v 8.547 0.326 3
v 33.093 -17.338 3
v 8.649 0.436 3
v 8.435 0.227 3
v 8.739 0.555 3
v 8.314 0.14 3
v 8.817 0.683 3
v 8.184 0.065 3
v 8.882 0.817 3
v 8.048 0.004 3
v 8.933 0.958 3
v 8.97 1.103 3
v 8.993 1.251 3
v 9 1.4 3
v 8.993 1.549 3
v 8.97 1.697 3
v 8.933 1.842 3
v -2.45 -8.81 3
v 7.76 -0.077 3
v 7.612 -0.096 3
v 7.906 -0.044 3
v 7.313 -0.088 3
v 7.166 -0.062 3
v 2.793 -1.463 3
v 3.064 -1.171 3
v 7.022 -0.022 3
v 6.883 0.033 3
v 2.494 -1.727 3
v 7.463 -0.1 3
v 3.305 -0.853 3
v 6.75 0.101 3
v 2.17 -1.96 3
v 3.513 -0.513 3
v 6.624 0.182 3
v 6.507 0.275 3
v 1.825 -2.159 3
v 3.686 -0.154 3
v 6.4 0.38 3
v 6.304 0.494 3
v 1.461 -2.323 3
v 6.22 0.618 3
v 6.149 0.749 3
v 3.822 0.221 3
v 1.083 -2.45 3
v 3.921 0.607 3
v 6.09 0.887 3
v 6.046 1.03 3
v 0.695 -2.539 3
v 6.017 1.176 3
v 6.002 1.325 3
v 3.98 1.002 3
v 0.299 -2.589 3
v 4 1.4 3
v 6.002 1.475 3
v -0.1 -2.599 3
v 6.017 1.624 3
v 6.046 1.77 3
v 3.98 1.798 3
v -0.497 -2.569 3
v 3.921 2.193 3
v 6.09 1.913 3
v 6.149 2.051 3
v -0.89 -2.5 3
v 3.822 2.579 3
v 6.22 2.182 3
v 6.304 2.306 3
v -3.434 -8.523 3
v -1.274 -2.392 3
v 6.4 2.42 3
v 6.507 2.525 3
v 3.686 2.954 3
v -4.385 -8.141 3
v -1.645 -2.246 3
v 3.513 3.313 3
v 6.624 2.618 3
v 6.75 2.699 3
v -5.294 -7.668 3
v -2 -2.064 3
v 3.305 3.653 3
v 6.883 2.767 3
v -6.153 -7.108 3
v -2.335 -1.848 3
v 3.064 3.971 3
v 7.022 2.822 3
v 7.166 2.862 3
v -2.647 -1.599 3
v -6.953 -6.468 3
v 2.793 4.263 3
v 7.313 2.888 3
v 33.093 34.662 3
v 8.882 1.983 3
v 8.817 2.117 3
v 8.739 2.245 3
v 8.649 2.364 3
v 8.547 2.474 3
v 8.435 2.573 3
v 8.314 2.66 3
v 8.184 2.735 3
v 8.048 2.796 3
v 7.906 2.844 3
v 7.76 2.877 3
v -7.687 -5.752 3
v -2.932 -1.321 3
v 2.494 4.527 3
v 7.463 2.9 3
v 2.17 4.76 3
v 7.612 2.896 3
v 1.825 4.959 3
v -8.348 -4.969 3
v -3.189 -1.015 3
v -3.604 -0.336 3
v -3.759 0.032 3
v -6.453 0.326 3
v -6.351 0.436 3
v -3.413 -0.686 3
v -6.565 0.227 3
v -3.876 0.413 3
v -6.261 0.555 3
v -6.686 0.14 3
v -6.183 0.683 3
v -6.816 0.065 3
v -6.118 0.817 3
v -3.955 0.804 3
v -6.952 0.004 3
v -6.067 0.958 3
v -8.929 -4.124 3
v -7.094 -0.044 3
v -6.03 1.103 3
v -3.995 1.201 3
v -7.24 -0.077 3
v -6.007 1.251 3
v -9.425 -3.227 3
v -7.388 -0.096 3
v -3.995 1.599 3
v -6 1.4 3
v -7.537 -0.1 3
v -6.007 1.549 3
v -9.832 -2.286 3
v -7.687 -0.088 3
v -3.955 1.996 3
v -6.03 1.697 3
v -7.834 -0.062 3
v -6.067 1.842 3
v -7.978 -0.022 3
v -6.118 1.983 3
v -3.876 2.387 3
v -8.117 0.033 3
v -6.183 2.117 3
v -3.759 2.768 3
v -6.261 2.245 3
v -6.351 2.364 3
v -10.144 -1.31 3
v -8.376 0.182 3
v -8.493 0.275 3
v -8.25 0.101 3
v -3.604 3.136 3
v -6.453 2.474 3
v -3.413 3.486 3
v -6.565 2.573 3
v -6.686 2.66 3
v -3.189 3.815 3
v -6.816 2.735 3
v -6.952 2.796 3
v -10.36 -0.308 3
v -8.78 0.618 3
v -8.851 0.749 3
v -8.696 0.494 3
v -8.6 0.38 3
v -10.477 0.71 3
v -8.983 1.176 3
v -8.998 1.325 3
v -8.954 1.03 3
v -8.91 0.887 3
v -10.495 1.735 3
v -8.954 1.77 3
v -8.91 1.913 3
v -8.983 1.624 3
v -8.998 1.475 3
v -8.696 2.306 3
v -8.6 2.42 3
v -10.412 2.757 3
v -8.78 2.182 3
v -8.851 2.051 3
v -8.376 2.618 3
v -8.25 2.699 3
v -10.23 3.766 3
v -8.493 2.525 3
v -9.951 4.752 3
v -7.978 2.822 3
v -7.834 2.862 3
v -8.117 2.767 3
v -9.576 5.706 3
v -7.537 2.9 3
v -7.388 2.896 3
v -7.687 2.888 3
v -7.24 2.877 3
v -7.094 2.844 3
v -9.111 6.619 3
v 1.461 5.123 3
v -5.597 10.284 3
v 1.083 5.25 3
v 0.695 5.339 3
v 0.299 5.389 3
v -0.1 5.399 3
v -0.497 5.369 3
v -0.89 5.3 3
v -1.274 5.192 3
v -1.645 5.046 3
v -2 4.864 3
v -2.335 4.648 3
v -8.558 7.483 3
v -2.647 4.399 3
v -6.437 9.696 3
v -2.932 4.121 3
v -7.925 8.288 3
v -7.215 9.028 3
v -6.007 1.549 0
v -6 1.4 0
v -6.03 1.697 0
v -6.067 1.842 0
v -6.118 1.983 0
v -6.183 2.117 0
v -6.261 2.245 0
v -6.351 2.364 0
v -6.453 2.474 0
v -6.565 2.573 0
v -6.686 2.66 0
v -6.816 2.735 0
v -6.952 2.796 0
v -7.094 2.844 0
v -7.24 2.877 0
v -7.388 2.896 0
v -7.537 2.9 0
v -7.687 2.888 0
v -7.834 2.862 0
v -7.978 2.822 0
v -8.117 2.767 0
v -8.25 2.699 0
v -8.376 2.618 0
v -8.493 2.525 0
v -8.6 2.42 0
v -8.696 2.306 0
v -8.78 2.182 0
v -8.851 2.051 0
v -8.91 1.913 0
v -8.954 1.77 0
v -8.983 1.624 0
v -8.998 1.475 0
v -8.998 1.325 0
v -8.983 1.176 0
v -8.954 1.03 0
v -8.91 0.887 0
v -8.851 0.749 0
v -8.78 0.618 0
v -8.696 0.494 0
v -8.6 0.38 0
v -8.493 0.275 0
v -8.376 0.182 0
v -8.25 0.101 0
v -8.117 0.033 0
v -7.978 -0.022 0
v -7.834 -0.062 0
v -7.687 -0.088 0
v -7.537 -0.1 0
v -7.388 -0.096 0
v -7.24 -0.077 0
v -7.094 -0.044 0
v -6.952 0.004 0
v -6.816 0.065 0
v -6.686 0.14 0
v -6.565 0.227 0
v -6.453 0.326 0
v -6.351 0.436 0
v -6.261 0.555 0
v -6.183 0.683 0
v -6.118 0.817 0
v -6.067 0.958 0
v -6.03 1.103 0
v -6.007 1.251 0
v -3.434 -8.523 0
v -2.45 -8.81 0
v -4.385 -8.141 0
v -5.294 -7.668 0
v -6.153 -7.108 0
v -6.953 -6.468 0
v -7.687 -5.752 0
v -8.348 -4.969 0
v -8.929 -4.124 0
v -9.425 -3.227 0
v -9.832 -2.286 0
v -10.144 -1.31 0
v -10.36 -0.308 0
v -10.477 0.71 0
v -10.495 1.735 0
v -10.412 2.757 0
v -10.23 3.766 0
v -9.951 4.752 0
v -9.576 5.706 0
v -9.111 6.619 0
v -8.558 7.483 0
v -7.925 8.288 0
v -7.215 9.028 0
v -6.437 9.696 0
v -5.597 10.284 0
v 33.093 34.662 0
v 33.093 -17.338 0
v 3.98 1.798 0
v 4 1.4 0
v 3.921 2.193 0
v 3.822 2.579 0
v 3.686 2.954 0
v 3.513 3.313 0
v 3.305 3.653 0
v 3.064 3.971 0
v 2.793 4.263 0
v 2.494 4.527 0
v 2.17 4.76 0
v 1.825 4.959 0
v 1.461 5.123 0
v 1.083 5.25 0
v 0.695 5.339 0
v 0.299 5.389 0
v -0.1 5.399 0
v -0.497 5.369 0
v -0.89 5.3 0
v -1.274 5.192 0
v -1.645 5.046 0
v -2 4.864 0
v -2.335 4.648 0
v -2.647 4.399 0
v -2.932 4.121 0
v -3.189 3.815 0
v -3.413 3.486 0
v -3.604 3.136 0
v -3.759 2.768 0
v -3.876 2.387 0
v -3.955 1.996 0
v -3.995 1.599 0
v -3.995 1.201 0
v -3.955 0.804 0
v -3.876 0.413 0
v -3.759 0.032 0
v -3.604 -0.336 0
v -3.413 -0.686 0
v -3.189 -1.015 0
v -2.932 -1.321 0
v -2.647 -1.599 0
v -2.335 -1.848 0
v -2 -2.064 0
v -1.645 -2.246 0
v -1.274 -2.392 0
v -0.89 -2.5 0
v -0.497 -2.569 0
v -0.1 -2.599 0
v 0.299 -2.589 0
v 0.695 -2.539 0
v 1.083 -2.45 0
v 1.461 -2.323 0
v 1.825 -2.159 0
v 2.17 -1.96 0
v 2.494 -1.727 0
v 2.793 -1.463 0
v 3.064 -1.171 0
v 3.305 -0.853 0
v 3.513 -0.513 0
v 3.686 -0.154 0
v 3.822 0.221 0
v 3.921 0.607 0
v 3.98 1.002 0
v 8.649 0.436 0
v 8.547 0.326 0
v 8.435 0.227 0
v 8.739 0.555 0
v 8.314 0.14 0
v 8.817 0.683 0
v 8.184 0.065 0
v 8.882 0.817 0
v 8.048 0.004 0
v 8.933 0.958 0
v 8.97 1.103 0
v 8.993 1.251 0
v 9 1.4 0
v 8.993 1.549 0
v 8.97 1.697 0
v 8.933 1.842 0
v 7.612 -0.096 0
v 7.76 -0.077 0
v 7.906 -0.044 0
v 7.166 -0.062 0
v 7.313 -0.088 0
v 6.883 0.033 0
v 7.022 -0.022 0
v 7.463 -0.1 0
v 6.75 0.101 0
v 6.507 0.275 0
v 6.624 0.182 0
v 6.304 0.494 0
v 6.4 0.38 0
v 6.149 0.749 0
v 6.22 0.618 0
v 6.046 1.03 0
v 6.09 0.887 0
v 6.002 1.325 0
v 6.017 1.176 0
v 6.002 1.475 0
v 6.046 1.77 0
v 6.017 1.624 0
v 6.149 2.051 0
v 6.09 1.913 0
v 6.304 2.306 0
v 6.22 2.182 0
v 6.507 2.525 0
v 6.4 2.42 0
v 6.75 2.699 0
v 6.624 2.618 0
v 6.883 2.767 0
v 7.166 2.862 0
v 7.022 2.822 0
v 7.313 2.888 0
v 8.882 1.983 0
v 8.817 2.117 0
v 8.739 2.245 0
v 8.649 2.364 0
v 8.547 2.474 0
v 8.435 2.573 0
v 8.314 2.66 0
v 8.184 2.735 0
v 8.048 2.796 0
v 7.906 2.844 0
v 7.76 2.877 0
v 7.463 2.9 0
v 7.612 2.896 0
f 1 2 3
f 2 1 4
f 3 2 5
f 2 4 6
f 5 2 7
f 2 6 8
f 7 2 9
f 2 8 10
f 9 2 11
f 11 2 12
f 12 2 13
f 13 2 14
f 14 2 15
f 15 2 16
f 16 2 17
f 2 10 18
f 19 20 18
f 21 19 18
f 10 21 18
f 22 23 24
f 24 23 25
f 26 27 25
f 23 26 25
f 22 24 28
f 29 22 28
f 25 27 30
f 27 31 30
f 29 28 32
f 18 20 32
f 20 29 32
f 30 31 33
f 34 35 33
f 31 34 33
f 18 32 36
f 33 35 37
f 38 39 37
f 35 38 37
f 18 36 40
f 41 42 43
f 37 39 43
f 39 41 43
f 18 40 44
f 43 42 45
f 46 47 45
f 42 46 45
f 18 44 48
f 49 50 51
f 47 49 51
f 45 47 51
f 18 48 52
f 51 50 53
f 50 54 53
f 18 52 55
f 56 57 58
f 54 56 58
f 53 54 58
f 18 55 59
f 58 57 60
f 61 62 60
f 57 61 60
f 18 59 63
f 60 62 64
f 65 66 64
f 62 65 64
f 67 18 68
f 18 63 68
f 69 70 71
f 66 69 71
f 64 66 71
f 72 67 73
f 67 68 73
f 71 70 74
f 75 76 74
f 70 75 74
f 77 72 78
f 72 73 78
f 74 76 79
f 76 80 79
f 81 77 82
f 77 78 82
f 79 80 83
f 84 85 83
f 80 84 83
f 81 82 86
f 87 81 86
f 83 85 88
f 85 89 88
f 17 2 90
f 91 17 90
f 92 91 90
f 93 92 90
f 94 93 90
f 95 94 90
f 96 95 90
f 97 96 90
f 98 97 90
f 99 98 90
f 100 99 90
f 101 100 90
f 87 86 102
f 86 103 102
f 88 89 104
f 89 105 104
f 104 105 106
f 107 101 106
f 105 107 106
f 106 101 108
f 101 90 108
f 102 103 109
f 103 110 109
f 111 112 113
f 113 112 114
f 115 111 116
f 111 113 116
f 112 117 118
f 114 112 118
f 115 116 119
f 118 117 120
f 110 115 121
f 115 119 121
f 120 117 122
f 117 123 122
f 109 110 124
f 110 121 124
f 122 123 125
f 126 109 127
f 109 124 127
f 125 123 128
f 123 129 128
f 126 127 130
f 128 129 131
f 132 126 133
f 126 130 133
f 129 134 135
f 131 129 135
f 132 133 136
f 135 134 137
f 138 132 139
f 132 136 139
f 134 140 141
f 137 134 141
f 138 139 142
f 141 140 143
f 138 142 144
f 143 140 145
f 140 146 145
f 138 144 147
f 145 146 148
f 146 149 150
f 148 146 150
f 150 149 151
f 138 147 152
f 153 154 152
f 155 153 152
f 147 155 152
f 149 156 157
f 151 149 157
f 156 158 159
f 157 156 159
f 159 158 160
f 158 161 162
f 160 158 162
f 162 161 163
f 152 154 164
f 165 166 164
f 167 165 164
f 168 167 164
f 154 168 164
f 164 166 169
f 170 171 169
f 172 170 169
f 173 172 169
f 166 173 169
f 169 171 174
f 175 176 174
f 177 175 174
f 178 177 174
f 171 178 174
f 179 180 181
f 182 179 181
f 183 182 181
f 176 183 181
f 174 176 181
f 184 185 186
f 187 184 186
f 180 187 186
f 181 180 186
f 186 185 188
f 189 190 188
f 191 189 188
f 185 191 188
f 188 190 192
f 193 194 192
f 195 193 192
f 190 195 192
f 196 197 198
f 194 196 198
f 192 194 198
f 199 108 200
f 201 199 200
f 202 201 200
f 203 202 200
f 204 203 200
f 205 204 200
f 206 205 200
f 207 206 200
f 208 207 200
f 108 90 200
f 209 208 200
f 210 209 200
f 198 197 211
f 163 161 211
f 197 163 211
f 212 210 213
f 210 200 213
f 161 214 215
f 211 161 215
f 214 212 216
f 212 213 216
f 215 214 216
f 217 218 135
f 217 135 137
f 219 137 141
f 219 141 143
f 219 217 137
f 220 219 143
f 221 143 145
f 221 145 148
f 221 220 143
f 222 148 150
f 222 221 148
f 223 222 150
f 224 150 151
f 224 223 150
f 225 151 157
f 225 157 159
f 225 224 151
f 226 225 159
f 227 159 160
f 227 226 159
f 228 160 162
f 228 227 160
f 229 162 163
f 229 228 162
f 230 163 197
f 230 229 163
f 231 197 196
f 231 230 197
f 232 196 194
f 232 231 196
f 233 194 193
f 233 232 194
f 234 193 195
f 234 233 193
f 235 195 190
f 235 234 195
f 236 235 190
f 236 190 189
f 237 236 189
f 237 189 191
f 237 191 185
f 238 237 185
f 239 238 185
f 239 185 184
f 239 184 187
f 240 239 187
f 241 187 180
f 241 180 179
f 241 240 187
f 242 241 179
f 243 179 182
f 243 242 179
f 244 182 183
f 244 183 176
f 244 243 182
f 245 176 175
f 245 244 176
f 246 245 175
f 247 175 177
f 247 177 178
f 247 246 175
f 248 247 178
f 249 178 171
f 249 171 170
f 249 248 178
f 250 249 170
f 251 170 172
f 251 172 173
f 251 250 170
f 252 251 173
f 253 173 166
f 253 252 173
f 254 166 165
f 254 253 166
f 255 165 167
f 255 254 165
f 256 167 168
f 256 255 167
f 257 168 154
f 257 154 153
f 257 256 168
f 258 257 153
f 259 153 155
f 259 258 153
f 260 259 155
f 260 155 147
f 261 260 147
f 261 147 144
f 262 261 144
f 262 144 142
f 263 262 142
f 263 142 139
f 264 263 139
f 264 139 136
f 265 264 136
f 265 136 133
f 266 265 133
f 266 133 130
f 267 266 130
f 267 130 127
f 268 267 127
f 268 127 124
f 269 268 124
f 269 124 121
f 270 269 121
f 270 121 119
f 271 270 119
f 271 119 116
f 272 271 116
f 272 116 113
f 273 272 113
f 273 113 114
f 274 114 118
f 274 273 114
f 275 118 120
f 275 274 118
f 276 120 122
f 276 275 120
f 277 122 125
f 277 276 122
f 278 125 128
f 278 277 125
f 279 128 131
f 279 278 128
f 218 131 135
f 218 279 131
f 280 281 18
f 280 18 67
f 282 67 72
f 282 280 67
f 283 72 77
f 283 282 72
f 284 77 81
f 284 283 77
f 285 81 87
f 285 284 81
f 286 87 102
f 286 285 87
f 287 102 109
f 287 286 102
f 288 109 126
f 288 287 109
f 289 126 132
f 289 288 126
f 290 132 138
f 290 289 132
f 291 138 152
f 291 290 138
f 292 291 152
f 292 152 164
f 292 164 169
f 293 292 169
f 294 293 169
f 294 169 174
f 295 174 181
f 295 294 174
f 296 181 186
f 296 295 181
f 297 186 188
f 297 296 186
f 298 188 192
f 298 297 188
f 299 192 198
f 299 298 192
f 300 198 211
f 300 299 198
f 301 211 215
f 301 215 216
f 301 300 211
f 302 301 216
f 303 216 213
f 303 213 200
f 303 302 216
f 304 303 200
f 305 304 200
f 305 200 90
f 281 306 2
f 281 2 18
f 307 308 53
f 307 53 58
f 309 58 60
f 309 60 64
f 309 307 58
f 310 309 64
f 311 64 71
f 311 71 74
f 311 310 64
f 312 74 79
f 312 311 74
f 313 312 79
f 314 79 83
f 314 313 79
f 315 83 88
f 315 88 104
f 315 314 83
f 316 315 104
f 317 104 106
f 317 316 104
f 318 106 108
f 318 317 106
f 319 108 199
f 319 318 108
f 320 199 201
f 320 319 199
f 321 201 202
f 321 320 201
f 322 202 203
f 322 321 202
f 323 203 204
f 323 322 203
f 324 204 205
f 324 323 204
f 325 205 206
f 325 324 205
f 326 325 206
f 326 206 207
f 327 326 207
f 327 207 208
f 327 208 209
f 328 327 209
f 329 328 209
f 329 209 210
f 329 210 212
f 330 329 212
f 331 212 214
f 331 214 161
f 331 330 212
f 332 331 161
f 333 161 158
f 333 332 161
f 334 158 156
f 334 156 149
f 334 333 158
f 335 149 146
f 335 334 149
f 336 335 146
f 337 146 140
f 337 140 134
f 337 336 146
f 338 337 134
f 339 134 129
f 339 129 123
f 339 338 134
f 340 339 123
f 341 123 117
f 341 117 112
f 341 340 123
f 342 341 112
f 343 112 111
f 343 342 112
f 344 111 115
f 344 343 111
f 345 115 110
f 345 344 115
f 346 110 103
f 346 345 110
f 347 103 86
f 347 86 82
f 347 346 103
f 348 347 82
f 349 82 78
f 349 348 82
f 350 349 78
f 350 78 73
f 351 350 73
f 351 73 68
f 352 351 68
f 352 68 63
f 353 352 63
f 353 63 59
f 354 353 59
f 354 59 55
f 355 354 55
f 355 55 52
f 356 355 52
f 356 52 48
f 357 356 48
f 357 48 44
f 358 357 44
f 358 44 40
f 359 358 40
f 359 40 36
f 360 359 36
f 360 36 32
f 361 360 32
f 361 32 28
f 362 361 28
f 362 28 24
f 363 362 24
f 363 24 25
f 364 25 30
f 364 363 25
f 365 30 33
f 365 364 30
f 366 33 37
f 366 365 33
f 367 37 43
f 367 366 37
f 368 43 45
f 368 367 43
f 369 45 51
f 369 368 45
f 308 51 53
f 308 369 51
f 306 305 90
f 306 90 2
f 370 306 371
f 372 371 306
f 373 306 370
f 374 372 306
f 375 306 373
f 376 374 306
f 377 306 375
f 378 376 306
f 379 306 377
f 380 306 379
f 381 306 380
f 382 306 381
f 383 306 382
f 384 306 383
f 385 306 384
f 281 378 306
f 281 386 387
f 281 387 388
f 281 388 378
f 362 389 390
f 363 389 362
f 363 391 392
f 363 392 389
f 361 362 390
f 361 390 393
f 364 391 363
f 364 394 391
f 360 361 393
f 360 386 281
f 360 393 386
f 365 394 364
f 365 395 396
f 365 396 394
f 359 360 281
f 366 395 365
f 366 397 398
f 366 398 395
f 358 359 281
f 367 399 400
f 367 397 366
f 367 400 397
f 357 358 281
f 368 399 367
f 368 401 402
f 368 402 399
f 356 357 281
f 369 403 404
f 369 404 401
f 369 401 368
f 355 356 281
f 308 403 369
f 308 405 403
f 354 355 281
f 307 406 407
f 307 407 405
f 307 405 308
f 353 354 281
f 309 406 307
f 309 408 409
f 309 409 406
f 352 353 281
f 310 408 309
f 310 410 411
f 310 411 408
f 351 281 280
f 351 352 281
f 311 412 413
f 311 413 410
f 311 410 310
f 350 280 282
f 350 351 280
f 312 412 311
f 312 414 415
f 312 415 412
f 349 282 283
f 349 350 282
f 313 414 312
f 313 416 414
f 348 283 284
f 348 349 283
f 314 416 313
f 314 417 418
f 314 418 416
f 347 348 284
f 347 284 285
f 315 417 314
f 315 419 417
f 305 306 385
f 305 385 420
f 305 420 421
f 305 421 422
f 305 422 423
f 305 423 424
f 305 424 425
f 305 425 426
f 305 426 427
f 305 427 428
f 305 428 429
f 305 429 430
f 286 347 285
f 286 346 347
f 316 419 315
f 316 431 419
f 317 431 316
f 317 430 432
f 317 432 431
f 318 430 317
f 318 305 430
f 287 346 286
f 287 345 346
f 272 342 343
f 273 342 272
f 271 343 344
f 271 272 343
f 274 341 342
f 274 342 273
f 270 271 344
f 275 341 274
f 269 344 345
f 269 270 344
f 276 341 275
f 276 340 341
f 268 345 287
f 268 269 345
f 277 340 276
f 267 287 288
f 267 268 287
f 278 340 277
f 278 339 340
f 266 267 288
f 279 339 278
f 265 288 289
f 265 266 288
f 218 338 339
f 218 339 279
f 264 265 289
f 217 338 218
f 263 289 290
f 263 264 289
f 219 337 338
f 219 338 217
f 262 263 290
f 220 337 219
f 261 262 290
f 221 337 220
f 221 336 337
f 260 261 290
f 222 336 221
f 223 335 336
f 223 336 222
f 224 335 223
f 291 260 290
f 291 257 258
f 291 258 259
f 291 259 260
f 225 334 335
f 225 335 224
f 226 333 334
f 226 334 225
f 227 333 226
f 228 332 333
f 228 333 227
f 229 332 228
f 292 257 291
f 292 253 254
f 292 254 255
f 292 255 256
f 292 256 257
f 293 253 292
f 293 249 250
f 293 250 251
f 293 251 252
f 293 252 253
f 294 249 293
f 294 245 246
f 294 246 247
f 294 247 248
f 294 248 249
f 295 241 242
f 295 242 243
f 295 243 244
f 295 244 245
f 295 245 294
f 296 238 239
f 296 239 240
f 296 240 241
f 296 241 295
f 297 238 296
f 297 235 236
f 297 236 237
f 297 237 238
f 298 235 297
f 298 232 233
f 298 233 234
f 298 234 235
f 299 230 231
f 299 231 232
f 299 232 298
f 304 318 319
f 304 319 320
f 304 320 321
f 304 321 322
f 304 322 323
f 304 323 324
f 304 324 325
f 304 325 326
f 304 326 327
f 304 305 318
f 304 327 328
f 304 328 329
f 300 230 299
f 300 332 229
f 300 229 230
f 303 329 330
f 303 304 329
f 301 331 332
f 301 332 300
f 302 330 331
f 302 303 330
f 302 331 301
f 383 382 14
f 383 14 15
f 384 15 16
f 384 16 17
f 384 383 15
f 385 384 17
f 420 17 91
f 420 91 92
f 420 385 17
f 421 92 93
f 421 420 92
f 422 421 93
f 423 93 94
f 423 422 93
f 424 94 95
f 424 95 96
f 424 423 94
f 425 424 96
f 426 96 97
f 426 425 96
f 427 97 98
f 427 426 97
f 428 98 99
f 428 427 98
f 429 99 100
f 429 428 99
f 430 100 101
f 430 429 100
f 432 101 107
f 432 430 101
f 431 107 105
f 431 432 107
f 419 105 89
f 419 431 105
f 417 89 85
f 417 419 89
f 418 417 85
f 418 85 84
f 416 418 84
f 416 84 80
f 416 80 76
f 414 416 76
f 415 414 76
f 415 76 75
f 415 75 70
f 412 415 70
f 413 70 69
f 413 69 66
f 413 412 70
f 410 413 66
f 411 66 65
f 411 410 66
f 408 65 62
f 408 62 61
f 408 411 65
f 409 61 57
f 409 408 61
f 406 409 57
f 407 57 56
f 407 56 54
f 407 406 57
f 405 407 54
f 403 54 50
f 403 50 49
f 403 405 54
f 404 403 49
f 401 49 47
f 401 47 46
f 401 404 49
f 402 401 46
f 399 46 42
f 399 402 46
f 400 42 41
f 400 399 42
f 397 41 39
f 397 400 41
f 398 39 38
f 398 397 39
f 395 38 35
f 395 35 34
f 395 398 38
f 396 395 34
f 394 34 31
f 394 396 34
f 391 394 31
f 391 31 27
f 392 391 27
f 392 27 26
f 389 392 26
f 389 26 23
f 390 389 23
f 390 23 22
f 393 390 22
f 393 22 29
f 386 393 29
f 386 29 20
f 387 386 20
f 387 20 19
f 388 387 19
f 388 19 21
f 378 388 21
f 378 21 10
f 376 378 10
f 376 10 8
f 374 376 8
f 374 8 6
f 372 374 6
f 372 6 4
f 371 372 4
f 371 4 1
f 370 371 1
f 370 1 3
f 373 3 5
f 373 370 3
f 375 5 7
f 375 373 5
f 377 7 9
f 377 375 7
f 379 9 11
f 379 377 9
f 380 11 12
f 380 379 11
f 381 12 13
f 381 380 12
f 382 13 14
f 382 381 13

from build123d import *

# Parameters (mm, degrees)
MODEL_R                 = 1.5
MODEL_R_2               = 4.000000302
SALIENTE_EXTRUIR1_DEPTH = 3


with BuildPart() as part:
    # Model → Saliente-Extruir1 (new body)
    with BuildSketch(Plane.XY):
        with BuildLine():
            Line((33.092598, 34.66167), (33.092598, -17.33833))
            Line((33.092598, -17.33833), (-2.449857, -8.810201))
            ThreePointArc((-2.449857, -8.810201), (-10.360174953, -0.307858771), (-5.597443, 10.283616))
            Line((-5.597443, 10.283616), (33.092598, 34.66167))
        make_face()
        with Locations((7.5, 1.4)):
            Circle(MODEL_R, mode=Mode.SUBTRACT)
        with Locations((-7.5, 1.4)):
            Circle(MODEL_R, mode=Mode.SUBTRACT)
        with Locations((-3.02e-07, 1.399999887)):
            Circle(MODEL_R_2, mode=Mode.SUBTRACT)
    extrude(amount=SALIENTE_EXTRUIR1_DEPTH)


solid = part.part
